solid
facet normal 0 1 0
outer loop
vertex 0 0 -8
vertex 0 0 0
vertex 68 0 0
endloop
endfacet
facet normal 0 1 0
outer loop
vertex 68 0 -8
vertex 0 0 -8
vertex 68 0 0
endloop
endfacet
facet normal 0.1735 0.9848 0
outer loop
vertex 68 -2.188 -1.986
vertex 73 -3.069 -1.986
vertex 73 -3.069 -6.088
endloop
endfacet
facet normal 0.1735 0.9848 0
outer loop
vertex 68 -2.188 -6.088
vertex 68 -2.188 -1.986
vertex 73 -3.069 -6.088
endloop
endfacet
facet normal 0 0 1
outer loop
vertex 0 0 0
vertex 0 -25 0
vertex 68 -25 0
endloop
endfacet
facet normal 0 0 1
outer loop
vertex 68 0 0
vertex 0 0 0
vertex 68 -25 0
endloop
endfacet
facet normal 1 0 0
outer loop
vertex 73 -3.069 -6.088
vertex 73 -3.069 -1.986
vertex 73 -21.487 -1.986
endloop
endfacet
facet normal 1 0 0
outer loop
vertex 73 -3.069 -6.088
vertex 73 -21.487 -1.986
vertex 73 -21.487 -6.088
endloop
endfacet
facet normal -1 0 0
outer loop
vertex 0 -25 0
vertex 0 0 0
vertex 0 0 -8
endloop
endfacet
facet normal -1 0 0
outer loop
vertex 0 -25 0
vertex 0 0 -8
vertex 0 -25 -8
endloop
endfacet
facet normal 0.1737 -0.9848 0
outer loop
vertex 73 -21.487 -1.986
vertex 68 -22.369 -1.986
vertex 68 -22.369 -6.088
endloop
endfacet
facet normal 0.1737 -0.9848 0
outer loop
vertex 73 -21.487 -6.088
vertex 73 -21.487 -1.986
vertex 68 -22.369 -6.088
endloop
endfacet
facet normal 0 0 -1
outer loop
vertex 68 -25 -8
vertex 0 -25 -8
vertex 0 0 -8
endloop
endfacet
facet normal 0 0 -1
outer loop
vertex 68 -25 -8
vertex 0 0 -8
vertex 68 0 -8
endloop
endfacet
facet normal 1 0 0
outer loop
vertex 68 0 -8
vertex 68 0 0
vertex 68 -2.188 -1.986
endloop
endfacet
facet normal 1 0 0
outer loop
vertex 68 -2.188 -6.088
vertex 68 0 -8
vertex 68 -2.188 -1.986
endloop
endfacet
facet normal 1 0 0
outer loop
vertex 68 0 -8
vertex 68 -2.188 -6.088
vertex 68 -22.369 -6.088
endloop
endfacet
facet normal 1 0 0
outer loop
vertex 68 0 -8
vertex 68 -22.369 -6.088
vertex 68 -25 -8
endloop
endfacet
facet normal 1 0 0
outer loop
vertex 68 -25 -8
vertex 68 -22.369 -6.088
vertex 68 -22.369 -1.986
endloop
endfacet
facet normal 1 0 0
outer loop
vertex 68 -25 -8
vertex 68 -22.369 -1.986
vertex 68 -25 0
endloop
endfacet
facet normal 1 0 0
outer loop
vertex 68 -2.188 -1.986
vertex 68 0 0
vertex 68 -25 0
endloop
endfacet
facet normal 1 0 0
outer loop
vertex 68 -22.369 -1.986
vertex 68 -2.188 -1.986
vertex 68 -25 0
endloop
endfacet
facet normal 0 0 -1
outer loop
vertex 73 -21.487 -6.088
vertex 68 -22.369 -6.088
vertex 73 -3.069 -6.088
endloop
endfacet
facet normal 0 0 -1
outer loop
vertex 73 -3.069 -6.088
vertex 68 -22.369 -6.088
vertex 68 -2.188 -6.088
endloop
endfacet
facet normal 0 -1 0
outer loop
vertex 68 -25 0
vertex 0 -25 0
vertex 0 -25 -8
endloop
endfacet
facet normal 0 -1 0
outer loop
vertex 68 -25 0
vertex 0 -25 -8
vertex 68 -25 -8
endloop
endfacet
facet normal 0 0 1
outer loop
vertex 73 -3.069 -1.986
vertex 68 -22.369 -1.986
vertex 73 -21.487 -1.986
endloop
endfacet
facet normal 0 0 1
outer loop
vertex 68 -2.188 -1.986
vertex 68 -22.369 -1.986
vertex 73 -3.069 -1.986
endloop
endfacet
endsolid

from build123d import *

# Parameters (mm, degrees)
SKETCH1_W           = 68
SKETCH1_H           = 25
BOSS_EXTRUDE1_DEPTH = 8
SKETCH13_W          = 4.102736362
SKETCH13_H          = 20.181027508
BOSS_EXTRUDE5_DEPTH = 5
CHAMFER1_SIZE2      = 0.881634904
CHAMFER1_SIZE       = 5
CHAMFER2_SIZE2      = 5
CHAMFER2_SIZE       = 0.881634904


with BuildPart() as part:
    # Sketch1 → Boss-Extrude1 (new body)
    with BuildSketch(Plane(origin=(0, 0, 0), x_dir=(1, 0, 0), z_dir=(0, 0, -1))):
        with Locations((34, 12.5)):
            Rectangle(SKETCH1_W, SKETCH1_H)
    extrude(amount=BOSS_EXTRUDE1_DEPTH)

    # Sketch13 → Boss-Extrude5 (add)
    with BuildSketch(Plane(origin=(68, 0, 0), x_dir=(0, 0, -1), z_dir=(1, 0, 0))):
        with Locations((4.036961589, -12.278230467)):
            Rectangle(SKETCH13_W, SKETCH13_H)
    extrude(amount=BOSS_EXTRUDE5_DEPTH)

    # Chamfer1
    chamfer1_edges = [part.edges().sort_by_distance(p)[0] for p in [
        (73, -2.187716713, -4.036961589),
    ]]
    chamfer1_side = [part.faces().sort_by_distance(p)[0] for p in [
        (72.982367302, -2.187716713, -4.036961589),
    ]]
    chamfer(chamfer1_edges, length=CHAMFER1_SIZE - 0.0001, length2=CHAMFER1_SIZE2 - 0.0001, reference=chamfer1_side[0])  # a hair under: the kernel refuses the full size

    # Chamfer2
    chamfer2_edges = [part.edges().sort_by_distance(p)[0] for p in [
        (73, -22.368744221, -4.036961589),
    ]]
    chamfer2_side = [part.faces().sort_by_distance(p)[0] for p in [
        (73, -22.351111523, -4.036961589),
    ]]
    chamfer(chamfer2_edges, length=CHAMFER2_SIZE - 0.0001, length2=CHAMFER2_SIZE2 - 0.0001, reference=chamfer2_side[0])  # a hair under: the kernel refuses the full size


solid = part.part
